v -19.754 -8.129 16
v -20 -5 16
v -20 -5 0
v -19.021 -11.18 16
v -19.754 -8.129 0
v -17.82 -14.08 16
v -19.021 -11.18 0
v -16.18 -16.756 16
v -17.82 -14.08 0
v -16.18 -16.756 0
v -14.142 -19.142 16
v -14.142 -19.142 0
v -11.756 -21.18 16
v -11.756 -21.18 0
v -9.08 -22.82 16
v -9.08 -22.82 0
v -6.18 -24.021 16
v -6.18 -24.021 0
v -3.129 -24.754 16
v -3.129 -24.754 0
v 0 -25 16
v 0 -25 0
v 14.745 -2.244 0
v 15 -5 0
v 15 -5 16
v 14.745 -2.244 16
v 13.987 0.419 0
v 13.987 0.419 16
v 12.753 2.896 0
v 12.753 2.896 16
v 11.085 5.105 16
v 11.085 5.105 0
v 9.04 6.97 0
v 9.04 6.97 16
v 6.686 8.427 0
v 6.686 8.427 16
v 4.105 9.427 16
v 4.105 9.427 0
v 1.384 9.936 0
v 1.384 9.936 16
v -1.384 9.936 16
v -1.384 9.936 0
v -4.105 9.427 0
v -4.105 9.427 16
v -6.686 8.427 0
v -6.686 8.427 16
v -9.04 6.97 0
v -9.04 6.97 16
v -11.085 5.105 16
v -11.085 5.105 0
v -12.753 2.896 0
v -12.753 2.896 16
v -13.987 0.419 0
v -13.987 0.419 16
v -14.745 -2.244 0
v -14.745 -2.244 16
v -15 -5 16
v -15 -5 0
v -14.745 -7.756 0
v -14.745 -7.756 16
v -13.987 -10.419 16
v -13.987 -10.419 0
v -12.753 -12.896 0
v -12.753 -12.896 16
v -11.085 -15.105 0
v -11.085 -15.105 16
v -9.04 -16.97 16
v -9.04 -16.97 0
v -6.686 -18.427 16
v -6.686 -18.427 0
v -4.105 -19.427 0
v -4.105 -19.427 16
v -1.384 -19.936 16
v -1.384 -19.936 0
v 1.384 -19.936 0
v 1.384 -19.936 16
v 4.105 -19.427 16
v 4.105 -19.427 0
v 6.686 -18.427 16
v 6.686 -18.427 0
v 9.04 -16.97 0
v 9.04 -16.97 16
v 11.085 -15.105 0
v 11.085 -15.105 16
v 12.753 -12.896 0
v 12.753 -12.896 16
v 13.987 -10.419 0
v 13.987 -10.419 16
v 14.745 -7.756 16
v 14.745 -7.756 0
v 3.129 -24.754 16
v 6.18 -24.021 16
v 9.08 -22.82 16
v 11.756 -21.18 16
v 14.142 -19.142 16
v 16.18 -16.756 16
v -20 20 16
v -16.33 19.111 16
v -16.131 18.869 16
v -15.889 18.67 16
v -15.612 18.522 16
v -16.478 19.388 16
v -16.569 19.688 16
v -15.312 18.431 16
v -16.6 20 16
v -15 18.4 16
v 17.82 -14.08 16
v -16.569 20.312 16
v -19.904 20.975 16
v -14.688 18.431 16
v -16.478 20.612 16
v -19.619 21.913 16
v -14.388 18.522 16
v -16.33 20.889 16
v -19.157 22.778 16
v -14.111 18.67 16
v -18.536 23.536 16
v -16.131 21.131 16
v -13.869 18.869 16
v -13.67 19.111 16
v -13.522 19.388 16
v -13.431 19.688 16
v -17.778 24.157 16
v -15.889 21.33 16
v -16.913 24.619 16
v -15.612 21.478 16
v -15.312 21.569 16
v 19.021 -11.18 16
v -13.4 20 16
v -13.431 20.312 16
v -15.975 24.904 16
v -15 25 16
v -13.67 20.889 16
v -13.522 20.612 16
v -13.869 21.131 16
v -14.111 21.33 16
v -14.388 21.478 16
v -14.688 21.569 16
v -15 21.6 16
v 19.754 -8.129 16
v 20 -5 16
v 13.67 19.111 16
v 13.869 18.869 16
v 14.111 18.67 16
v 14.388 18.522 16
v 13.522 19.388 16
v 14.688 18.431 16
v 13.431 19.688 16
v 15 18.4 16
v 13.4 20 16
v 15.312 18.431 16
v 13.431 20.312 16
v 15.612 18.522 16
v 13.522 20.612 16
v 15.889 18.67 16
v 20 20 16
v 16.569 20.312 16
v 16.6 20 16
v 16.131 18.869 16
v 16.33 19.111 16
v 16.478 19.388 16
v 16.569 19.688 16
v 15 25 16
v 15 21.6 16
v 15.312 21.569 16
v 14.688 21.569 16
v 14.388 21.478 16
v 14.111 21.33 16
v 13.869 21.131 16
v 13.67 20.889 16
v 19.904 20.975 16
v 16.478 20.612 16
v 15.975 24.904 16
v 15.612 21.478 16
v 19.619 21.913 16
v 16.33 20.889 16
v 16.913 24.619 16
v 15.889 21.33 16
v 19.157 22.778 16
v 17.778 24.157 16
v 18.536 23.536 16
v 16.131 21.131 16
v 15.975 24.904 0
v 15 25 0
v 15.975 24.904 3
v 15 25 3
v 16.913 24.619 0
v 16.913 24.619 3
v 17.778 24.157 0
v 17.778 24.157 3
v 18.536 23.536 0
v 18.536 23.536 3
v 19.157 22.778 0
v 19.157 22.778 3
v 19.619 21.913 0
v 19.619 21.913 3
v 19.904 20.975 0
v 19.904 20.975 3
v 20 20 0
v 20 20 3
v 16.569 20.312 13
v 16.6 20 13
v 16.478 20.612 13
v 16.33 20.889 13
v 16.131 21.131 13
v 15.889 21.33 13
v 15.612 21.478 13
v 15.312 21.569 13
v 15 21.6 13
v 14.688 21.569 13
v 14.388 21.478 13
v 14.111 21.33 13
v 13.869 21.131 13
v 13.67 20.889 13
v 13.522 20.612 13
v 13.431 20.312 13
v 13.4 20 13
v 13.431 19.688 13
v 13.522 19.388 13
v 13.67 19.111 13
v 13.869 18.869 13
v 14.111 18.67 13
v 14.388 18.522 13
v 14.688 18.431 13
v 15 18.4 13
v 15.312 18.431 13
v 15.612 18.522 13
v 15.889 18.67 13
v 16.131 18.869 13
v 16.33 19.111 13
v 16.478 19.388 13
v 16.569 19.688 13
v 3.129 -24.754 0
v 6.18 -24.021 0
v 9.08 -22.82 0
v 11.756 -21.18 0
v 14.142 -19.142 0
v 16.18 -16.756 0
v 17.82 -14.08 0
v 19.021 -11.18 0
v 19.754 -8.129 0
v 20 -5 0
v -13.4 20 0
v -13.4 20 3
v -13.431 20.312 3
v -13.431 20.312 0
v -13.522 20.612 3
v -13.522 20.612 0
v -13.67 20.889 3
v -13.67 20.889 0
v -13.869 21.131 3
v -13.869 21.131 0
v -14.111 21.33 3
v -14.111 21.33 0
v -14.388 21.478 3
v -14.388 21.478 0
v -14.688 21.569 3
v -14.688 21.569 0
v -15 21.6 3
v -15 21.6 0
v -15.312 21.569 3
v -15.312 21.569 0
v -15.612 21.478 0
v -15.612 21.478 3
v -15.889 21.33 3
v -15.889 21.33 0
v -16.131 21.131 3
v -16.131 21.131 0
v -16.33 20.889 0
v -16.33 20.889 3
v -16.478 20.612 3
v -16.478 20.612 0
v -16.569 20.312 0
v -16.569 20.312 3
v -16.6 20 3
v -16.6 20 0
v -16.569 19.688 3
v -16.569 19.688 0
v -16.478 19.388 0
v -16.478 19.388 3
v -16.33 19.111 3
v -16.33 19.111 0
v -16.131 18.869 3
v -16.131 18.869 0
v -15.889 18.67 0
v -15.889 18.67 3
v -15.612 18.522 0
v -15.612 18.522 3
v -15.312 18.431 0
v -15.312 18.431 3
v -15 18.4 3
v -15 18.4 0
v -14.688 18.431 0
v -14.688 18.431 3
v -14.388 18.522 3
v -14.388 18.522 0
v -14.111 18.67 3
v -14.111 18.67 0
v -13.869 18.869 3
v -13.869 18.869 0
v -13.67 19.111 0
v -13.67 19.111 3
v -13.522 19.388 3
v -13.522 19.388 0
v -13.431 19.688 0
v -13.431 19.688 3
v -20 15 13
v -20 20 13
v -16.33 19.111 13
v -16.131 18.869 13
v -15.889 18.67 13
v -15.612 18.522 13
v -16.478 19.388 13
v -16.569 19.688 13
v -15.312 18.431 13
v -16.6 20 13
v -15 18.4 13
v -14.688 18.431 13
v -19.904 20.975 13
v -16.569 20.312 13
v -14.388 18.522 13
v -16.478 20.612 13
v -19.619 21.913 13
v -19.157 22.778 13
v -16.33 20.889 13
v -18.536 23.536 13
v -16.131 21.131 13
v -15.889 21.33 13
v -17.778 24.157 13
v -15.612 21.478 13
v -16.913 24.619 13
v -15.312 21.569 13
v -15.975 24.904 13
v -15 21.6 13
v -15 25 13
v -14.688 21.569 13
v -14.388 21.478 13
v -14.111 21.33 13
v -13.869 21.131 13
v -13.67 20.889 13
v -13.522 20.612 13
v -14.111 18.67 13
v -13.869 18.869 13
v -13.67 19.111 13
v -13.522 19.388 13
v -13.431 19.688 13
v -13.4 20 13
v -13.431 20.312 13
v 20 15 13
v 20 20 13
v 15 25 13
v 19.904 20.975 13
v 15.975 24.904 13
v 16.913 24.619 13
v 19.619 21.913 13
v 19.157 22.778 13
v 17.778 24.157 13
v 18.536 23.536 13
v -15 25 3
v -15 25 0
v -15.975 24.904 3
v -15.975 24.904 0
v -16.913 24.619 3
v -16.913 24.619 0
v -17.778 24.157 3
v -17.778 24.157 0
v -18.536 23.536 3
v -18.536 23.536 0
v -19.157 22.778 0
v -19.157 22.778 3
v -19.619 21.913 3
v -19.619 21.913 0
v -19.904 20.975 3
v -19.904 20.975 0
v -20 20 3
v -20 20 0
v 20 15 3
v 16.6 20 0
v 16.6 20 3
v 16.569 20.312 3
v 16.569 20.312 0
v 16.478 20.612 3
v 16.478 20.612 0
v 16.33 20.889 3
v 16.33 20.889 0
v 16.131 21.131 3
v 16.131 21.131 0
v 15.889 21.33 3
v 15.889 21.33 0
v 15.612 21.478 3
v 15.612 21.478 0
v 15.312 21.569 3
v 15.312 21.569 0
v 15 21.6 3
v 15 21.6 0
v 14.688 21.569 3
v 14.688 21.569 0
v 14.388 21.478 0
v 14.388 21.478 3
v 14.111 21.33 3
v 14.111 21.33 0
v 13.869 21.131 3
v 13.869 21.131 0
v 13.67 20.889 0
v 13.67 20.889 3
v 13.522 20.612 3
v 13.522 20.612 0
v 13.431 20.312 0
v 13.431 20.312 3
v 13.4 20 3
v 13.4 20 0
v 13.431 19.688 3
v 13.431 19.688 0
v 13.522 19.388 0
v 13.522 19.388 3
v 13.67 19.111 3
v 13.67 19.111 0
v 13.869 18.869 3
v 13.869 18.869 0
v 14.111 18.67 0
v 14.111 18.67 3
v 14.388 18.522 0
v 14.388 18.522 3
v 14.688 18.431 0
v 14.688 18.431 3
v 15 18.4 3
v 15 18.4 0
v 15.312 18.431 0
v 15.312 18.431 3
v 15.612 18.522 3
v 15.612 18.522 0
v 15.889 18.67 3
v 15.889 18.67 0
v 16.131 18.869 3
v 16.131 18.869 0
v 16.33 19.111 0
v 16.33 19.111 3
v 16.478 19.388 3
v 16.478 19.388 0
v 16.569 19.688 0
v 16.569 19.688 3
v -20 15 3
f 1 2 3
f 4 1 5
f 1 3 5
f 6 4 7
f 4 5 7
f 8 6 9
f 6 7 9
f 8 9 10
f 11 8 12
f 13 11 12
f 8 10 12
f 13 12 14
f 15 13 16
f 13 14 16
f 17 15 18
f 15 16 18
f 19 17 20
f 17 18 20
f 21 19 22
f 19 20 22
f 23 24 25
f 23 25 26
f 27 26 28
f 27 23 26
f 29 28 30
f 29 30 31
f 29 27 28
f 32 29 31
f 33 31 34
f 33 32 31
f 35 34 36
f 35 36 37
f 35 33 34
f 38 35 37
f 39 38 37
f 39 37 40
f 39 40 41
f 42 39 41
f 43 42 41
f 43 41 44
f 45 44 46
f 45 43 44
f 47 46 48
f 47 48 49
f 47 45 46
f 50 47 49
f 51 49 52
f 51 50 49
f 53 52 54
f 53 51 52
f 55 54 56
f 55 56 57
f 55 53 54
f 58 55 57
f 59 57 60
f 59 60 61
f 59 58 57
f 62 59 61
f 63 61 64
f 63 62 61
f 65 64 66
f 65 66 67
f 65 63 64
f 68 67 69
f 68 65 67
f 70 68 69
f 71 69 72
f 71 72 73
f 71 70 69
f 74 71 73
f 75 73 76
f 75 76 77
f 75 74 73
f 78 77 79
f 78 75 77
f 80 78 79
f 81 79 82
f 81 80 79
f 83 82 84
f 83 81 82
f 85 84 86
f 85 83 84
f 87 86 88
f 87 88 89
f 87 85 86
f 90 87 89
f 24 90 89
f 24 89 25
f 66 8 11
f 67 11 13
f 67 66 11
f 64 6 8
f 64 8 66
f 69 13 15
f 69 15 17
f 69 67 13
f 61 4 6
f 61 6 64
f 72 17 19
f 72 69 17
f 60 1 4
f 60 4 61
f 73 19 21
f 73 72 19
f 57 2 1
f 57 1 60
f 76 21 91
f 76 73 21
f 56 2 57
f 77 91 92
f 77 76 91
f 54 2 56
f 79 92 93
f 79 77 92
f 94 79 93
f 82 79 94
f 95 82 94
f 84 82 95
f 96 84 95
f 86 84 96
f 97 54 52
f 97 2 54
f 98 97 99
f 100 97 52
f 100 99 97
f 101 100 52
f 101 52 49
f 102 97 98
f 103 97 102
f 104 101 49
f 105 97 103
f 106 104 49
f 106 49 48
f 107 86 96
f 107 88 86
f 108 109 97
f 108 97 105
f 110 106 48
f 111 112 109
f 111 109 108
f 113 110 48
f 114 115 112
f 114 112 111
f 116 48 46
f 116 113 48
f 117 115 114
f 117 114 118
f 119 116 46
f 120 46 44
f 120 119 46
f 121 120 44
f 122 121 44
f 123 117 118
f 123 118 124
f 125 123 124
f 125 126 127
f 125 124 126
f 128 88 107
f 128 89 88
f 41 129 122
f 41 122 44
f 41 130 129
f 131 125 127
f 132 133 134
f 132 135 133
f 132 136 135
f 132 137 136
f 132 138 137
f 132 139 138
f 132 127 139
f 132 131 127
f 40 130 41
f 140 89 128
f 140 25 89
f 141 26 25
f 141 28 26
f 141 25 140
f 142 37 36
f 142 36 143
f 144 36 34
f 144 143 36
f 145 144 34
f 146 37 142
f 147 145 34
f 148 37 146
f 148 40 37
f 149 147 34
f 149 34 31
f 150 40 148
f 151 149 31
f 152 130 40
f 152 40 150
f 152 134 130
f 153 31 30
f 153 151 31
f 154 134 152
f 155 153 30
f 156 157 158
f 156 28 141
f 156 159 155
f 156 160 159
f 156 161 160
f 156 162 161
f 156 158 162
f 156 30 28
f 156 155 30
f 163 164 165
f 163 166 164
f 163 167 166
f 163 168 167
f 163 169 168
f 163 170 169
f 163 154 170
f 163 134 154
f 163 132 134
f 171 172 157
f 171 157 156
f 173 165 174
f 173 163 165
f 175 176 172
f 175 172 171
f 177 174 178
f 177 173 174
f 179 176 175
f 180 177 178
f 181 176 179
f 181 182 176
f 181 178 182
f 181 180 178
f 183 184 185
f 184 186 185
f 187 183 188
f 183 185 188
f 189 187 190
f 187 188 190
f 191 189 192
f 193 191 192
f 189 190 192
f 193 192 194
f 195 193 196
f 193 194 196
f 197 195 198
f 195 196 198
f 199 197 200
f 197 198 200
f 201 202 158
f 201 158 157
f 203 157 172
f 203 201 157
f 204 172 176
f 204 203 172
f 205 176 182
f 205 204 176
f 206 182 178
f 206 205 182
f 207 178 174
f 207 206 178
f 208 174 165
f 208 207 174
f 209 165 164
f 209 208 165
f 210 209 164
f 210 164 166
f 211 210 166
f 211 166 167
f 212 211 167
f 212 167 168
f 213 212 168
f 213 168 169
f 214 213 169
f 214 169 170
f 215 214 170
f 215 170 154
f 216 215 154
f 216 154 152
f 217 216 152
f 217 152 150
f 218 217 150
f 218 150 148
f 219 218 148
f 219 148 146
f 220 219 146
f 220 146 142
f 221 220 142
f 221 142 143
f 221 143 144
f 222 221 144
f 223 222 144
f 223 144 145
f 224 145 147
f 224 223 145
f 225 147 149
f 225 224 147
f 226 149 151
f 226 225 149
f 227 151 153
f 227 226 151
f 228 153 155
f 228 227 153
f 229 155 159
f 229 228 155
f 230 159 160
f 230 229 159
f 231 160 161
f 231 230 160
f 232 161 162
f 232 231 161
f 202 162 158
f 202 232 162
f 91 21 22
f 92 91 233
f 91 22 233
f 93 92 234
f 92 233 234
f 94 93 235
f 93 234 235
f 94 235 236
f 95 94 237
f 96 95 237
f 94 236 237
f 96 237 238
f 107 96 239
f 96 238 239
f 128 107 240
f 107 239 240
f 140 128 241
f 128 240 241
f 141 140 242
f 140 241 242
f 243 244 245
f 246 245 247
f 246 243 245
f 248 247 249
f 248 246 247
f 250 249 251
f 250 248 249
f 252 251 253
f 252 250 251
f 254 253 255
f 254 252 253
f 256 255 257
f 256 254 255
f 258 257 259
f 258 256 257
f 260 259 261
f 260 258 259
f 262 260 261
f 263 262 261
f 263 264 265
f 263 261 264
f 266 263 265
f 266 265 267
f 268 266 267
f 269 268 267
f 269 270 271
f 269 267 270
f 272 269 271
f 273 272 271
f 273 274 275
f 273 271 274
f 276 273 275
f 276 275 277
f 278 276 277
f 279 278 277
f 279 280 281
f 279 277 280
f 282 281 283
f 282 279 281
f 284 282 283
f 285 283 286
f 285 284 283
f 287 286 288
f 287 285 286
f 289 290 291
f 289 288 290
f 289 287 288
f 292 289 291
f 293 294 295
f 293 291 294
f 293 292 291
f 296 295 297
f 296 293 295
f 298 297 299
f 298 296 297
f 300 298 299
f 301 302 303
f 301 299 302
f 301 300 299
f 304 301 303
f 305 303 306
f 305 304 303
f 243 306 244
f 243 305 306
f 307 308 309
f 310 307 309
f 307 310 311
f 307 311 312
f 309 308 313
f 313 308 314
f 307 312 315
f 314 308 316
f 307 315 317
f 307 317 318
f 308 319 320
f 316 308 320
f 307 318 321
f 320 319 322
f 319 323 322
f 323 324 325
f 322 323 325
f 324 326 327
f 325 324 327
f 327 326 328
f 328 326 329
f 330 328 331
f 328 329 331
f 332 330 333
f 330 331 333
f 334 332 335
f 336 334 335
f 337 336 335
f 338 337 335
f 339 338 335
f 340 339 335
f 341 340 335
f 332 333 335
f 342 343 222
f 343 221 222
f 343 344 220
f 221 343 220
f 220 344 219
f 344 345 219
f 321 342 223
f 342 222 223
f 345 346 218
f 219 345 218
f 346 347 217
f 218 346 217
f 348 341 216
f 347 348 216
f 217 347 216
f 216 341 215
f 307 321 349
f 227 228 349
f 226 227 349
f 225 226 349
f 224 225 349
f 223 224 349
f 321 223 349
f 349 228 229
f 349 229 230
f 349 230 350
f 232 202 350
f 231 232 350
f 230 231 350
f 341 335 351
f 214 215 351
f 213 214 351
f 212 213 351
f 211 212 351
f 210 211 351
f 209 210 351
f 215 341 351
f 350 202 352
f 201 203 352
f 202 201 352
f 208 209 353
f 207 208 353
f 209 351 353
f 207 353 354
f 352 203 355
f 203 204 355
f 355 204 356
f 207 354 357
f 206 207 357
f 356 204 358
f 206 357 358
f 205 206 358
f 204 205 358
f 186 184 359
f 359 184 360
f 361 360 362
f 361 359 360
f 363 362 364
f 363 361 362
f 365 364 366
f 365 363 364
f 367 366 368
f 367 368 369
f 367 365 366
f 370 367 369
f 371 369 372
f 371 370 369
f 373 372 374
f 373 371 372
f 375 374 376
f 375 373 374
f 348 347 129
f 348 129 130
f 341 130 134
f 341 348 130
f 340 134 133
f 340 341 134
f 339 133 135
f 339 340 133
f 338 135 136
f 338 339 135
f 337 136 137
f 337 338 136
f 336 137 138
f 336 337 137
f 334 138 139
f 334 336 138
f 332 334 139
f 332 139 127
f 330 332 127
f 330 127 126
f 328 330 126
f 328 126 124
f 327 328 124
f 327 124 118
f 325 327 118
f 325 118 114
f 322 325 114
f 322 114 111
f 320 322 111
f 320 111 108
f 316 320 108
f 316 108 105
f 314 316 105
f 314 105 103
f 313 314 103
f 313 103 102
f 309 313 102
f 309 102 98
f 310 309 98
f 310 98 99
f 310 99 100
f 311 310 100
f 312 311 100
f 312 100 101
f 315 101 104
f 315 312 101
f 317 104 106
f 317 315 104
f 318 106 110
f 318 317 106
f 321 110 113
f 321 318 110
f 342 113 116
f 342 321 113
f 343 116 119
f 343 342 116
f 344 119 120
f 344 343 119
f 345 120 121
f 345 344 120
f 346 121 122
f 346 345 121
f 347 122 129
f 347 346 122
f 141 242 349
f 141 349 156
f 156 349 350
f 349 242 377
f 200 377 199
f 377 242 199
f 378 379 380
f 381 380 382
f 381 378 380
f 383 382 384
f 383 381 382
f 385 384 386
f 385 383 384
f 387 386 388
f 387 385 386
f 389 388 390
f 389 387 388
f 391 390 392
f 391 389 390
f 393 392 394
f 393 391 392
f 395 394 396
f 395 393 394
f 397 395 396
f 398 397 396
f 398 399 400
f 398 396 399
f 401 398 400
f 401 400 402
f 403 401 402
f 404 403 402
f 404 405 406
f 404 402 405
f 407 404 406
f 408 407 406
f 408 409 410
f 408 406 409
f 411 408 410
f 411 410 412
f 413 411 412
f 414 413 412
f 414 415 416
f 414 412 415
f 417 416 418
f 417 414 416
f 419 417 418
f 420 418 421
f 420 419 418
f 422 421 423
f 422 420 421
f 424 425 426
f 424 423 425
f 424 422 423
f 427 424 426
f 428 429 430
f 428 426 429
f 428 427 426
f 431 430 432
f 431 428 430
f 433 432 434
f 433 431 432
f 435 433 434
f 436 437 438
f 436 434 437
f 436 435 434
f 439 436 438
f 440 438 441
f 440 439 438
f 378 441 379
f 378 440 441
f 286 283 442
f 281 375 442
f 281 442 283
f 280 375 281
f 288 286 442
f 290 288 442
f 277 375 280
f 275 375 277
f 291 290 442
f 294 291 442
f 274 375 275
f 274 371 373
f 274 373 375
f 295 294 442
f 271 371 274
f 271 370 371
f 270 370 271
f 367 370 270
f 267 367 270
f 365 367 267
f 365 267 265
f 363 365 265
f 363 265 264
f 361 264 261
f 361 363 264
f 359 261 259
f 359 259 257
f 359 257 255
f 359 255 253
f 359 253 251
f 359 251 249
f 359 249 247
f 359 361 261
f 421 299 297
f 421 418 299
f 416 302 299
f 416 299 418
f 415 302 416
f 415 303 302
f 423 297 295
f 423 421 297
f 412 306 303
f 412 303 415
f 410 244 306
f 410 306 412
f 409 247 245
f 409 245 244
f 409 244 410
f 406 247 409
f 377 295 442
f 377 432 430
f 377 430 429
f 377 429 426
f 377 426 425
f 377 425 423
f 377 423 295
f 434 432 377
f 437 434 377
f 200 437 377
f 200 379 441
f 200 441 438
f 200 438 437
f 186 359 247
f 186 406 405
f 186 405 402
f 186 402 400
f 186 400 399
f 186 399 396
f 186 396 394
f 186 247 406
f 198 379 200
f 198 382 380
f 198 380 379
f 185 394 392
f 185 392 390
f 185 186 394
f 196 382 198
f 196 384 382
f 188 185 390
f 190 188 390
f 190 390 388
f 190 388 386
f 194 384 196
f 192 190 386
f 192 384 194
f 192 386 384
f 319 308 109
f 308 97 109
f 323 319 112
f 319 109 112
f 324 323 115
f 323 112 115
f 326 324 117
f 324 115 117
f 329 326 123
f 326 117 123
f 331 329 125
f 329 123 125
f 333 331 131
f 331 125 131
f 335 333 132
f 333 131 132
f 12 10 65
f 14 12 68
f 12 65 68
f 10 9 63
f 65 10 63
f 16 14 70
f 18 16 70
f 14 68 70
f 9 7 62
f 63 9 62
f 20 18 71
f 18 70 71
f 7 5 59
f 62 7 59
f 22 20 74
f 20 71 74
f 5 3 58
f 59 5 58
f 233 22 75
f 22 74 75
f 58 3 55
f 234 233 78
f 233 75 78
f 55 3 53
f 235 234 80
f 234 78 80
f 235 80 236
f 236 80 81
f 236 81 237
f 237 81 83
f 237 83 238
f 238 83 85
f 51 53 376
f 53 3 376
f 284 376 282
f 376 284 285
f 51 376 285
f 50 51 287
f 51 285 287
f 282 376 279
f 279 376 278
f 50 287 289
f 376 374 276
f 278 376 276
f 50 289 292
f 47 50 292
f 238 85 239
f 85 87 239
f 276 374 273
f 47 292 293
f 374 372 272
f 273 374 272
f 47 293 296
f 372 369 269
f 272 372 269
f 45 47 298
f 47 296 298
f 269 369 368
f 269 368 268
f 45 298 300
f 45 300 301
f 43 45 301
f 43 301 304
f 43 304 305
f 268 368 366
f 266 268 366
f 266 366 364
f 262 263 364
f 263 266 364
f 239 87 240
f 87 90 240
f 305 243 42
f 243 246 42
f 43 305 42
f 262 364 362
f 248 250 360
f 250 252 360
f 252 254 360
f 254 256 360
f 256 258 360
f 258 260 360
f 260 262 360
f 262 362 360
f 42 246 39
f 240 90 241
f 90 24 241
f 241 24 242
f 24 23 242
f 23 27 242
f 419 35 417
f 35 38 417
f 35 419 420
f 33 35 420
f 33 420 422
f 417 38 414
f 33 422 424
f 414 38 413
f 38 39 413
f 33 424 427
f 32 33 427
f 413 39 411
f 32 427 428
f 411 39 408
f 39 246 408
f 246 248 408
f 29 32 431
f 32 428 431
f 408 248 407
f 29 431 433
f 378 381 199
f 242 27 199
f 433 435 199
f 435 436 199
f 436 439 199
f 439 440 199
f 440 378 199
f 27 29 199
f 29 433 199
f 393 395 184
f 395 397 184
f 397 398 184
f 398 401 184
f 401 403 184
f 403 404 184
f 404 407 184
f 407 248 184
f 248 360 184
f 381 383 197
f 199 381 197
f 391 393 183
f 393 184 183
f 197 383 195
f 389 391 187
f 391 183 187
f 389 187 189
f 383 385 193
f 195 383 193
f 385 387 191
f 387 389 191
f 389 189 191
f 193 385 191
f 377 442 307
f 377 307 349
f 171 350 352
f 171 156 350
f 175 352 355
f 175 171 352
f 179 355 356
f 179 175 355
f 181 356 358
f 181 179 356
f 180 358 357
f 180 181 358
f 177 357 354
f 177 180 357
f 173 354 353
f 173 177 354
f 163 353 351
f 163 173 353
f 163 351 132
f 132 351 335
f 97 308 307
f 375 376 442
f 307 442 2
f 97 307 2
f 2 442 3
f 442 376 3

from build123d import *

# Parameters (mm, degrees)
SKETCH_1_R          = 15
SKETCH_1_R_2        = 1.6
EXTRUDE_1_DEPTH     = 16
SKETCH_2_W          = 40
SKETCH_2_H          = 10
CUT_EXTRUDE_1_DEPTH = 10
FILLET_2_R          = 5


with BuildPart() as part:
    # ｽｹｯﾁ1 → ﾎﾞｽ - 押し出し1 (new body)
    with BuildSketch(Plane.XY):
        with BuildLine():
            Line((20, 25), (-20, 25))
            Line((-20, 25), (-20, -5))
            ThreePointArc((-20, -5), (-14.142135624, -19.142135624), (0, -25))
            ThreePointArc((0, -25), (14.142135624, -19.142135624), (20, -5))
            Line((20, -5), (20, 25))
        make_face()
        with Locations((0, -5)):
            Circle(SKETCH_1_R, mode=Mode.SUBTRACT)
        with Locations((-15, 20)):
            Circle(SKETCH_1_R_2, mode=Mode.SUBTRACT)
        with Locations((15, 20)):
            Circle(SKETCH_1_R_2, mode=Mode.SUBTRACT)
    extrude(amount=EXTRUDE_1_DEPTH)

    # ｽｹｯﾁ2 → ｶｯﾄ - 押し出し1 (cut)
    with BuildSketch(Plane(origin=(0, 25, 0), x_dir=(1, 0, 0), z_dir=(0, 1, 0))):
        with Locations((0, -8)):
            Rectangle(SKETCH_2_W, SKETCH_2_H)
    extrude(amount=-CUT_EXTRUDE_1_DEPTH, mode=Mode.SUBTRACT)

    # ﾌｨﾚｯﾄ2
    fillet_2_edges = [part.edges().sort_by_distance(p)[0] for p in [
        (-20, 25, 14.5),
        (20, 25, 14.5),
        (-20, 25, 1.5),
        (20, 25, 1.5),
    ]]
    fillet(fillet_2_edges, radius=FILLET_2_R)


solid = part.part
